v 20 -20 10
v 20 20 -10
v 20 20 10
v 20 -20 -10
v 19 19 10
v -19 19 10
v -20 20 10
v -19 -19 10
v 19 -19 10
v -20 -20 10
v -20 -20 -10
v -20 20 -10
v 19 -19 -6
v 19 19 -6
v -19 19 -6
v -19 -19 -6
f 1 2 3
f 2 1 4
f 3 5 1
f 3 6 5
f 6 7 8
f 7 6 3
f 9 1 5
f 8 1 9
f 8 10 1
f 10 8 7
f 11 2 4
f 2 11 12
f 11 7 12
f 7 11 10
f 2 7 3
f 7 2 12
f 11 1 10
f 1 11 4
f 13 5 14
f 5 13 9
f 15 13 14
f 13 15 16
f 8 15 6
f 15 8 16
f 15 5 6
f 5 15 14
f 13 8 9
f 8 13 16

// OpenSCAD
difference() {
cube([40,40,20], center=true);
translate([0,0,4]) cube([38,38,20], center=true);
}
